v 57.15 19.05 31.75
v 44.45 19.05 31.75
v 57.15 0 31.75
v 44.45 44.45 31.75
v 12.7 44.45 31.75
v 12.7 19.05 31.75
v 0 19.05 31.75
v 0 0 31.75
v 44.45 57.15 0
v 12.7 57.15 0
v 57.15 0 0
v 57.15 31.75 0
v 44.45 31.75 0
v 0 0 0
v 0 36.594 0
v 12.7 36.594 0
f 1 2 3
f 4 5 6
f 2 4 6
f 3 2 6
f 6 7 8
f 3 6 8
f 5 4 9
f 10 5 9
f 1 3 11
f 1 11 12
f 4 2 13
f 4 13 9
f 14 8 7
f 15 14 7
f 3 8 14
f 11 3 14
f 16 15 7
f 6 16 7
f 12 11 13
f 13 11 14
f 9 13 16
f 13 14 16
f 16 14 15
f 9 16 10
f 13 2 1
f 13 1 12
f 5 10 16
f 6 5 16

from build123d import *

# Parameters (mm, degrees)
F1_DEPTH = 25.4
F3_DEPTH = 12.7
F5_DEPTH = 31.75
F6_DEPTH = 12.7
F8_DEPTH = 12.7
F9_DEPTH = 25.4


with BuildPart() as f1:
    # F0 (on Right) → F1 (new body)
    with BuildSketch(Plane.YZ):
        Polygon((0, 31.75), (0, 0), (31.75, 0), (19.05, 31.75), align=None)
        Polygon((19.05, 31.75), (31.75, 0), (57.15, 0), (57.15, 31.75), align=None)
    extrude(amount=F1_DEPTH)

    # F2 (on face) → F3 (cut)
    with BuildSketch(Plane.YZ.offset(25.4)):
        Polygon((57.15, 31.75), (19.05, 31.75), (31.75, 0), (57.15, 0), align=None)
    extrude(amount=-F3_DEPTH, mode=Mode.SUBTRACT)

    # F5 (add): faces of the model
    f5_faces = [f1.faces().sort_by_distance(p)[0] for p in [
        (12.7, 41.0633333333, 16.9333333333),
        (25.4, 12.9645833333, 14.5520833333),
    ]]
    extrude(f5_faces, amount=F5_DEPTH)

    # F4 (on face) → F6 (cut)
    with BuildSketch(Plane(origin=(0, 0, 0), x_dir=(0, -1, 0), z_dir=(-1, 0, 0))):
        Polygon((-57.15, 31.75), (-57.15, 0), (-36.5937203169, 0), (-19.05, 31.75), align=None)
    extrude(amount=-F6_DEPTH, mode=Mode.SUBTRACT)

    # F7 (on face) → F8 (cut)
    with BuildSketch(Plane.YZ.offset(44.45)):
        Polygon((57.15, 31.75), (44.45, 31.75), (57.15, 0), align=None)
    extrude(amount=-F8_DEPTH, mode=Mode.SUBTRACT)

    # F9 (cut): a face of the model
    f9_faces = [f1.faces().sort_by_distance(p)[0] for p in [
        (31.75, 52.9166666667, 21.1666666667),
    ]]
    extrude(f9_faces, amount=-F9_DEPTH, mode=Mode.SUBTRACT)


solid = f1.part
